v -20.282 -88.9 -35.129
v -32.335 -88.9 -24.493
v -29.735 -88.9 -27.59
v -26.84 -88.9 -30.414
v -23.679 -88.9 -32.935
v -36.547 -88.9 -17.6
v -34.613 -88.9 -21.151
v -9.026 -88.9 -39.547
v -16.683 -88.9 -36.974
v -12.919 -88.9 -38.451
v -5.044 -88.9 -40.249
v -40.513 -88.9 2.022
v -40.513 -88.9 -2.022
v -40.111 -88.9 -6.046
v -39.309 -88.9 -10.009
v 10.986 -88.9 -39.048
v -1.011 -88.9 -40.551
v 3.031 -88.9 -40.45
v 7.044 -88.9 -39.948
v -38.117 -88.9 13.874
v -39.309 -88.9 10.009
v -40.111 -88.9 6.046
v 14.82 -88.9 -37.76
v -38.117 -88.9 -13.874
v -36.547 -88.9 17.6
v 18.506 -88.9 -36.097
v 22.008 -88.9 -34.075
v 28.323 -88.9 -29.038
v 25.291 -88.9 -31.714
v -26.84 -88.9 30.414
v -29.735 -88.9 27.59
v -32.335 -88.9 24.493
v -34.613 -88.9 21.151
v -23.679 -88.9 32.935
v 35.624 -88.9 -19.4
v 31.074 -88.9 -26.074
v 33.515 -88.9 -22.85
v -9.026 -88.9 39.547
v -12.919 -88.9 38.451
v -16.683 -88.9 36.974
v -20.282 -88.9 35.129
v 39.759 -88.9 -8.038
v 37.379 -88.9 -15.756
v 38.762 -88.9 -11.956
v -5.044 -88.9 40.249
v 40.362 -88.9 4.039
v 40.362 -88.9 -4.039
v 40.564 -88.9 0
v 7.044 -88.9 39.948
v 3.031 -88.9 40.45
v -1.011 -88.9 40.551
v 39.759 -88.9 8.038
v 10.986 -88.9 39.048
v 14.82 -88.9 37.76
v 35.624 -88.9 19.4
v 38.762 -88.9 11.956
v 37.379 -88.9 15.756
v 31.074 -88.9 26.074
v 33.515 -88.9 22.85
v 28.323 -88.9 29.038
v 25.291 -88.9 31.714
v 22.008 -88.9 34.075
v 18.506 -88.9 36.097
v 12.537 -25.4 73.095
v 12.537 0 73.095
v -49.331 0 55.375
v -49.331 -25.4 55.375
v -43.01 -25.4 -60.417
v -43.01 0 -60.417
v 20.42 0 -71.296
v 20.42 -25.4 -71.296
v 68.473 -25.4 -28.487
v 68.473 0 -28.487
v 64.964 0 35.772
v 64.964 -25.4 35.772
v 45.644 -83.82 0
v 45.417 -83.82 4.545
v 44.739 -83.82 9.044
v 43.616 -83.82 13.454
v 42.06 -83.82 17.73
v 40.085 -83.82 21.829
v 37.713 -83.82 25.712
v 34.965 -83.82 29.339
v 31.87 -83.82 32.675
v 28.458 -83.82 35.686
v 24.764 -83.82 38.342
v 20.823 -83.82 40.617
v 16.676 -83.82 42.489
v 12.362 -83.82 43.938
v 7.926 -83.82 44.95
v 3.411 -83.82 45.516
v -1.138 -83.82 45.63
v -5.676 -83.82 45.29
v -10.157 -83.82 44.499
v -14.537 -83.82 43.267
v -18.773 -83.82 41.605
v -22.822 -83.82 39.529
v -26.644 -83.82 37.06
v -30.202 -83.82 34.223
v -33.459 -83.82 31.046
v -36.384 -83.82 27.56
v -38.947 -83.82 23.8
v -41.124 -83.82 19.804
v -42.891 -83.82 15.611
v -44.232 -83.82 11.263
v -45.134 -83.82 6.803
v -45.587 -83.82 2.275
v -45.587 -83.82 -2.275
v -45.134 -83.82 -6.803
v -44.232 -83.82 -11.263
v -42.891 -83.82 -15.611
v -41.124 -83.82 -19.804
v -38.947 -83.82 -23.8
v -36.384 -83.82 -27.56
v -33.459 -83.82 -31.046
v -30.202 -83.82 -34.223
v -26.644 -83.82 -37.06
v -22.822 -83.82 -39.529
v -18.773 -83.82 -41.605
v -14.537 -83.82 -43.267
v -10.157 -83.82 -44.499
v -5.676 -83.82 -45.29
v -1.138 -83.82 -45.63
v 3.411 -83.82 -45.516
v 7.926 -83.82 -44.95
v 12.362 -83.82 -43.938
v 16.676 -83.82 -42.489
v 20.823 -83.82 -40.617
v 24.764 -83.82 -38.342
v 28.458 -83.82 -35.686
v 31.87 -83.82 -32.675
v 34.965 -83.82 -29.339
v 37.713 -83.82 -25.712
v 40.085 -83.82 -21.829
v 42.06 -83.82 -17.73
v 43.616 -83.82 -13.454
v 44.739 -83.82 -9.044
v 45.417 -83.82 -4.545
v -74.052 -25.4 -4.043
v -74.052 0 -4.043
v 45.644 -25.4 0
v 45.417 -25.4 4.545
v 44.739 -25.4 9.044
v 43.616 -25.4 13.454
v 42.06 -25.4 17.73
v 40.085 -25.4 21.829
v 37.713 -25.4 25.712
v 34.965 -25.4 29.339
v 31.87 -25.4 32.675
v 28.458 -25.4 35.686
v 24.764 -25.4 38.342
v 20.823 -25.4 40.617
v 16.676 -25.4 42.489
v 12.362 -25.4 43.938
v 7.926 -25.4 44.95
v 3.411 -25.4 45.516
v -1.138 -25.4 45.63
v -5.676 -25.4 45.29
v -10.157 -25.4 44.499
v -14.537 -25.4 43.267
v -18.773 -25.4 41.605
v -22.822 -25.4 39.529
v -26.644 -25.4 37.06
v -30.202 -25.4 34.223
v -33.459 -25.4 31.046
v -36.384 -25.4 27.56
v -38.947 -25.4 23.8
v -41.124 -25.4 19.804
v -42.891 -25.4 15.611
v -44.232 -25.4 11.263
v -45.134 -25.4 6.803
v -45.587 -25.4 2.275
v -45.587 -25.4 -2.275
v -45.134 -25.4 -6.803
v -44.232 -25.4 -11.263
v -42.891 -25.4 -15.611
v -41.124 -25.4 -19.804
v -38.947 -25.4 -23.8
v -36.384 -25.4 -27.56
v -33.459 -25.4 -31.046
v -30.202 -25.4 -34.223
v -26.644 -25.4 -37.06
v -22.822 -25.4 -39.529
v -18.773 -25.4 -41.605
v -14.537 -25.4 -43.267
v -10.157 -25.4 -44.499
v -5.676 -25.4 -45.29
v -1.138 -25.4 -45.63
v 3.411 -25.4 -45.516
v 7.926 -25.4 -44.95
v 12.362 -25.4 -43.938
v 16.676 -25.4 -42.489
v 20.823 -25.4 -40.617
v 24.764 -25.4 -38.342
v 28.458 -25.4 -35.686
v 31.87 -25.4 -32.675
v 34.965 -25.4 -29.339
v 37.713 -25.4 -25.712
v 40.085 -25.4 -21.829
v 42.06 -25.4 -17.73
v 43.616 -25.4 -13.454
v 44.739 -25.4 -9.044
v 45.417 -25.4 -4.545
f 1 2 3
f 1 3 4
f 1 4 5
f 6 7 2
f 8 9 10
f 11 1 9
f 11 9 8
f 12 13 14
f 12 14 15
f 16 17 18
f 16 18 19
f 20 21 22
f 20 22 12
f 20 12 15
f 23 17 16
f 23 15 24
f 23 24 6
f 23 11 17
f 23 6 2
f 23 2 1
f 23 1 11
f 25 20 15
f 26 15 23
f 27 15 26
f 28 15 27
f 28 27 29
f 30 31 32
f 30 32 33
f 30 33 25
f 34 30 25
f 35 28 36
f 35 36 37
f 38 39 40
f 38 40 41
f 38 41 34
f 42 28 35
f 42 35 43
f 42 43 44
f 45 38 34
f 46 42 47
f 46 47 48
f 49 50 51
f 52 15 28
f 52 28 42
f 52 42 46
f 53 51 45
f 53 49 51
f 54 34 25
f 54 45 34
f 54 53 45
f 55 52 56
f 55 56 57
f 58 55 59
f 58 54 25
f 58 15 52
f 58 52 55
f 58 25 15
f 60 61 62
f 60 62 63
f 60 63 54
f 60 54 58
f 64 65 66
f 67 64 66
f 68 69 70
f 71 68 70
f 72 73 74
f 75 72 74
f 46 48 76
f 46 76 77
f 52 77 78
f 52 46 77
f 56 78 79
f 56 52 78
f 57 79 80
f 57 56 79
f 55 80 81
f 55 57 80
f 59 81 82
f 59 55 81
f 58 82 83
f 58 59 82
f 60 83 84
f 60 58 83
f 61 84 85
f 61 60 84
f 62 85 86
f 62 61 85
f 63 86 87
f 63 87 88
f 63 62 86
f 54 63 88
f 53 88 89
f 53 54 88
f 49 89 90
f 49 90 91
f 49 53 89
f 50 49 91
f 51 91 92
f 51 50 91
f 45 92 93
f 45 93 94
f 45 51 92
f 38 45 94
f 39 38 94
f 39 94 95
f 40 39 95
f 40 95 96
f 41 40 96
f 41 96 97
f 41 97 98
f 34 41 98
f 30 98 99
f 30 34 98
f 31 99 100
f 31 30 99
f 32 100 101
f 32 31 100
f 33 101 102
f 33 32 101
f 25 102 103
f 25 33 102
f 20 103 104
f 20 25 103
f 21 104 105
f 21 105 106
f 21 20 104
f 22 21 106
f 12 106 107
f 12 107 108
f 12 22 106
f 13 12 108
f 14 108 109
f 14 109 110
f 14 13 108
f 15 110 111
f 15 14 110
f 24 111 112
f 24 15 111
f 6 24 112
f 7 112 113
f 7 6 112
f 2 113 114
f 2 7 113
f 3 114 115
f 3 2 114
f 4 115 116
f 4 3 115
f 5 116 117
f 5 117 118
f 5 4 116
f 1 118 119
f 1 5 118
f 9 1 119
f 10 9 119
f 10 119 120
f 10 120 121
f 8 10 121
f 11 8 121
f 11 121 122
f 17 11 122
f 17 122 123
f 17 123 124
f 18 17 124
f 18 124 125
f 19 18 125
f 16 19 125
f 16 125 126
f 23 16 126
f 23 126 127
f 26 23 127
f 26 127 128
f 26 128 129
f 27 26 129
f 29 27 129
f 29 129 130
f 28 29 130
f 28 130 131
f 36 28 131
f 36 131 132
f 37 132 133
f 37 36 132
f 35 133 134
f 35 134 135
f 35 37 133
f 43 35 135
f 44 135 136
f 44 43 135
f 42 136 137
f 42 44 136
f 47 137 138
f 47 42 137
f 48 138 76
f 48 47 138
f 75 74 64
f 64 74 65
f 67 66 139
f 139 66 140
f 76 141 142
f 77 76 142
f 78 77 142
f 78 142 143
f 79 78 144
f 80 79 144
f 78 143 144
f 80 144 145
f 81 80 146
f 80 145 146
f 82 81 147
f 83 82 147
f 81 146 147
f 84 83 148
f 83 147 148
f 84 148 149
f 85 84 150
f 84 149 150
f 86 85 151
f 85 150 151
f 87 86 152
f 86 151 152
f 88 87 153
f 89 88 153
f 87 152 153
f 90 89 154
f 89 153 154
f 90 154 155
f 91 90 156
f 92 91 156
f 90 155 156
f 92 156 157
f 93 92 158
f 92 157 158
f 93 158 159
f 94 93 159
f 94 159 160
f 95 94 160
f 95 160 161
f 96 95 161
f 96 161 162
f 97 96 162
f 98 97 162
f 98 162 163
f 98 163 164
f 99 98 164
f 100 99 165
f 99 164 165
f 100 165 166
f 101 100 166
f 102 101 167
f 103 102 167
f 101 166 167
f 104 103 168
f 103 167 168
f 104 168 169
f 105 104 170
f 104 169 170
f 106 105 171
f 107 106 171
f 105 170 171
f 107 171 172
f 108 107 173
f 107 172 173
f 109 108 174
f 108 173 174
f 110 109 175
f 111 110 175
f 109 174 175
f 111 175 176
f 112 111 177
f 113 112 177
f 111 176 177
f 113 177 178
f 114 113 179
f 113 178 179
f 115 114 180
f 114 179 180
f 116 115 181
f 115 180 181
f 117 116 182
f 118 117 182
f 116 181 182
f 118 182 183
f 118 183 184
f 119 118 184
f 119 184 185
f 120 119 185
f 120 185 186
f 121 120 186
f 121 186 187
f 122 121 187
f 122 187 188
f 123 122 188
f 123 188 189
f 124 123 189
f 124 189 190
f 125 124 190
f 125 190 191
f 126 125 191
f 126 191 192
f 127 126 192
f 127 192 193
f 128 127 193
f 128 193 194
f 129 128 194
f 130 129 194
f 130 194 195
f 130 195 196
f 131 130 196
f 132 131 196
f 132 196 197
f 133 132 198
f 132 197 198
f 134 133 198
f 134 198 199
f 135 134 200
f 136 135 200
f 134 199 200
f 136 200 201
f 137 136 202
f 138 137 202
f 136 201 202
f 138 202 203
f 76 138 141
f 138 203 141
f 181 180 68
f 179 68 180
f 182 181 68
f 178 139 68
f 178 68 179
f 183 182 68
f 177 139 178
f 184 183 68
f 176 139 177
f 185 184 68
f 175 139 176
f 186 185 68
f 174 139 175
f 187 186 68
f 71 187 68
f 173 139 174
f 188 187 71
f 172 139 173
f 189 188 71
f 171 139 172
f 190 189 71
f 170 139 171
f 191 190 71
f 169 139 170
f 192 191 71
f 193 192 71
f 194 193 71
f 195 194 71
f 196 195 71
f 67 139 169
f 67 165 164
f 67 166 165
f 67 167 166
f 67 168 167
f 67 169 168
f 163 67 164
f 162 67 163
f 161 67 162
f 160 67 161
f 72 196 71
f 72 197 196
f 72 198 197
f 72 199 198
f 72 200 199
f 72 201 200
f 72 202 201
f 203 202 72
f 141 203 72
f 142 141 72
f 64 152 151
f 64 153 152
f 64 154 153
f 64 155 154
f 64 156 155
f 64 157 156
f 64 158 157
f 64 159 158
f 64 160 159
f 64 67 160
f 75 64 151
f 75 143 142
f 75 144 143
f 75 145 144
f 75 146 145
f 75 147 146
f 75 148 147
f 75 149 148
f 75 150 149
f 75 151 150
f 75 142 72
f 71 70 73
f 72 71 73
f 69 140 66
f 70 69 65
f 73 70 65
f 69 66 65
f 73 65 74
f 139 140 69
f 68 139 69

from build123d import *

# Parameters (mm, degrees)
F1_DEPTH = 25.4
F2_R     = 45.643757
F3_DEPTH = 63.5
F4_SIZE  = 5.08


with BuildPart() as f1:
    # F0 (on Front) → F1 (new body)
    with BuildSketch(Plane.XZ):
        Polygon((-74.051848, -4.042859), (-43.009737, -60.416748), (20.419583, -71.295593), (68.472541, -28.487402), (64.964279, 35.772383), (12.53659, 73.094834), (-49.331407, 55.375384), align=None)
    extrude(amount=F1_DEPTH)

    # F2 (on face) → F3 (join)
    with BuildSketch(Plane.XZ.offset(25.4)):
        Circle(F2_R)
    extrude(amount=F3_DEPTH)

    # F4
    f4_edges = [f1.edges().sort_by_distance(p)[0] for p in [
        (-45.643757, -88.9, 0),
    ]]
    chamfer(f4_edges, length=F4_SIZE)


solid = f1.part
